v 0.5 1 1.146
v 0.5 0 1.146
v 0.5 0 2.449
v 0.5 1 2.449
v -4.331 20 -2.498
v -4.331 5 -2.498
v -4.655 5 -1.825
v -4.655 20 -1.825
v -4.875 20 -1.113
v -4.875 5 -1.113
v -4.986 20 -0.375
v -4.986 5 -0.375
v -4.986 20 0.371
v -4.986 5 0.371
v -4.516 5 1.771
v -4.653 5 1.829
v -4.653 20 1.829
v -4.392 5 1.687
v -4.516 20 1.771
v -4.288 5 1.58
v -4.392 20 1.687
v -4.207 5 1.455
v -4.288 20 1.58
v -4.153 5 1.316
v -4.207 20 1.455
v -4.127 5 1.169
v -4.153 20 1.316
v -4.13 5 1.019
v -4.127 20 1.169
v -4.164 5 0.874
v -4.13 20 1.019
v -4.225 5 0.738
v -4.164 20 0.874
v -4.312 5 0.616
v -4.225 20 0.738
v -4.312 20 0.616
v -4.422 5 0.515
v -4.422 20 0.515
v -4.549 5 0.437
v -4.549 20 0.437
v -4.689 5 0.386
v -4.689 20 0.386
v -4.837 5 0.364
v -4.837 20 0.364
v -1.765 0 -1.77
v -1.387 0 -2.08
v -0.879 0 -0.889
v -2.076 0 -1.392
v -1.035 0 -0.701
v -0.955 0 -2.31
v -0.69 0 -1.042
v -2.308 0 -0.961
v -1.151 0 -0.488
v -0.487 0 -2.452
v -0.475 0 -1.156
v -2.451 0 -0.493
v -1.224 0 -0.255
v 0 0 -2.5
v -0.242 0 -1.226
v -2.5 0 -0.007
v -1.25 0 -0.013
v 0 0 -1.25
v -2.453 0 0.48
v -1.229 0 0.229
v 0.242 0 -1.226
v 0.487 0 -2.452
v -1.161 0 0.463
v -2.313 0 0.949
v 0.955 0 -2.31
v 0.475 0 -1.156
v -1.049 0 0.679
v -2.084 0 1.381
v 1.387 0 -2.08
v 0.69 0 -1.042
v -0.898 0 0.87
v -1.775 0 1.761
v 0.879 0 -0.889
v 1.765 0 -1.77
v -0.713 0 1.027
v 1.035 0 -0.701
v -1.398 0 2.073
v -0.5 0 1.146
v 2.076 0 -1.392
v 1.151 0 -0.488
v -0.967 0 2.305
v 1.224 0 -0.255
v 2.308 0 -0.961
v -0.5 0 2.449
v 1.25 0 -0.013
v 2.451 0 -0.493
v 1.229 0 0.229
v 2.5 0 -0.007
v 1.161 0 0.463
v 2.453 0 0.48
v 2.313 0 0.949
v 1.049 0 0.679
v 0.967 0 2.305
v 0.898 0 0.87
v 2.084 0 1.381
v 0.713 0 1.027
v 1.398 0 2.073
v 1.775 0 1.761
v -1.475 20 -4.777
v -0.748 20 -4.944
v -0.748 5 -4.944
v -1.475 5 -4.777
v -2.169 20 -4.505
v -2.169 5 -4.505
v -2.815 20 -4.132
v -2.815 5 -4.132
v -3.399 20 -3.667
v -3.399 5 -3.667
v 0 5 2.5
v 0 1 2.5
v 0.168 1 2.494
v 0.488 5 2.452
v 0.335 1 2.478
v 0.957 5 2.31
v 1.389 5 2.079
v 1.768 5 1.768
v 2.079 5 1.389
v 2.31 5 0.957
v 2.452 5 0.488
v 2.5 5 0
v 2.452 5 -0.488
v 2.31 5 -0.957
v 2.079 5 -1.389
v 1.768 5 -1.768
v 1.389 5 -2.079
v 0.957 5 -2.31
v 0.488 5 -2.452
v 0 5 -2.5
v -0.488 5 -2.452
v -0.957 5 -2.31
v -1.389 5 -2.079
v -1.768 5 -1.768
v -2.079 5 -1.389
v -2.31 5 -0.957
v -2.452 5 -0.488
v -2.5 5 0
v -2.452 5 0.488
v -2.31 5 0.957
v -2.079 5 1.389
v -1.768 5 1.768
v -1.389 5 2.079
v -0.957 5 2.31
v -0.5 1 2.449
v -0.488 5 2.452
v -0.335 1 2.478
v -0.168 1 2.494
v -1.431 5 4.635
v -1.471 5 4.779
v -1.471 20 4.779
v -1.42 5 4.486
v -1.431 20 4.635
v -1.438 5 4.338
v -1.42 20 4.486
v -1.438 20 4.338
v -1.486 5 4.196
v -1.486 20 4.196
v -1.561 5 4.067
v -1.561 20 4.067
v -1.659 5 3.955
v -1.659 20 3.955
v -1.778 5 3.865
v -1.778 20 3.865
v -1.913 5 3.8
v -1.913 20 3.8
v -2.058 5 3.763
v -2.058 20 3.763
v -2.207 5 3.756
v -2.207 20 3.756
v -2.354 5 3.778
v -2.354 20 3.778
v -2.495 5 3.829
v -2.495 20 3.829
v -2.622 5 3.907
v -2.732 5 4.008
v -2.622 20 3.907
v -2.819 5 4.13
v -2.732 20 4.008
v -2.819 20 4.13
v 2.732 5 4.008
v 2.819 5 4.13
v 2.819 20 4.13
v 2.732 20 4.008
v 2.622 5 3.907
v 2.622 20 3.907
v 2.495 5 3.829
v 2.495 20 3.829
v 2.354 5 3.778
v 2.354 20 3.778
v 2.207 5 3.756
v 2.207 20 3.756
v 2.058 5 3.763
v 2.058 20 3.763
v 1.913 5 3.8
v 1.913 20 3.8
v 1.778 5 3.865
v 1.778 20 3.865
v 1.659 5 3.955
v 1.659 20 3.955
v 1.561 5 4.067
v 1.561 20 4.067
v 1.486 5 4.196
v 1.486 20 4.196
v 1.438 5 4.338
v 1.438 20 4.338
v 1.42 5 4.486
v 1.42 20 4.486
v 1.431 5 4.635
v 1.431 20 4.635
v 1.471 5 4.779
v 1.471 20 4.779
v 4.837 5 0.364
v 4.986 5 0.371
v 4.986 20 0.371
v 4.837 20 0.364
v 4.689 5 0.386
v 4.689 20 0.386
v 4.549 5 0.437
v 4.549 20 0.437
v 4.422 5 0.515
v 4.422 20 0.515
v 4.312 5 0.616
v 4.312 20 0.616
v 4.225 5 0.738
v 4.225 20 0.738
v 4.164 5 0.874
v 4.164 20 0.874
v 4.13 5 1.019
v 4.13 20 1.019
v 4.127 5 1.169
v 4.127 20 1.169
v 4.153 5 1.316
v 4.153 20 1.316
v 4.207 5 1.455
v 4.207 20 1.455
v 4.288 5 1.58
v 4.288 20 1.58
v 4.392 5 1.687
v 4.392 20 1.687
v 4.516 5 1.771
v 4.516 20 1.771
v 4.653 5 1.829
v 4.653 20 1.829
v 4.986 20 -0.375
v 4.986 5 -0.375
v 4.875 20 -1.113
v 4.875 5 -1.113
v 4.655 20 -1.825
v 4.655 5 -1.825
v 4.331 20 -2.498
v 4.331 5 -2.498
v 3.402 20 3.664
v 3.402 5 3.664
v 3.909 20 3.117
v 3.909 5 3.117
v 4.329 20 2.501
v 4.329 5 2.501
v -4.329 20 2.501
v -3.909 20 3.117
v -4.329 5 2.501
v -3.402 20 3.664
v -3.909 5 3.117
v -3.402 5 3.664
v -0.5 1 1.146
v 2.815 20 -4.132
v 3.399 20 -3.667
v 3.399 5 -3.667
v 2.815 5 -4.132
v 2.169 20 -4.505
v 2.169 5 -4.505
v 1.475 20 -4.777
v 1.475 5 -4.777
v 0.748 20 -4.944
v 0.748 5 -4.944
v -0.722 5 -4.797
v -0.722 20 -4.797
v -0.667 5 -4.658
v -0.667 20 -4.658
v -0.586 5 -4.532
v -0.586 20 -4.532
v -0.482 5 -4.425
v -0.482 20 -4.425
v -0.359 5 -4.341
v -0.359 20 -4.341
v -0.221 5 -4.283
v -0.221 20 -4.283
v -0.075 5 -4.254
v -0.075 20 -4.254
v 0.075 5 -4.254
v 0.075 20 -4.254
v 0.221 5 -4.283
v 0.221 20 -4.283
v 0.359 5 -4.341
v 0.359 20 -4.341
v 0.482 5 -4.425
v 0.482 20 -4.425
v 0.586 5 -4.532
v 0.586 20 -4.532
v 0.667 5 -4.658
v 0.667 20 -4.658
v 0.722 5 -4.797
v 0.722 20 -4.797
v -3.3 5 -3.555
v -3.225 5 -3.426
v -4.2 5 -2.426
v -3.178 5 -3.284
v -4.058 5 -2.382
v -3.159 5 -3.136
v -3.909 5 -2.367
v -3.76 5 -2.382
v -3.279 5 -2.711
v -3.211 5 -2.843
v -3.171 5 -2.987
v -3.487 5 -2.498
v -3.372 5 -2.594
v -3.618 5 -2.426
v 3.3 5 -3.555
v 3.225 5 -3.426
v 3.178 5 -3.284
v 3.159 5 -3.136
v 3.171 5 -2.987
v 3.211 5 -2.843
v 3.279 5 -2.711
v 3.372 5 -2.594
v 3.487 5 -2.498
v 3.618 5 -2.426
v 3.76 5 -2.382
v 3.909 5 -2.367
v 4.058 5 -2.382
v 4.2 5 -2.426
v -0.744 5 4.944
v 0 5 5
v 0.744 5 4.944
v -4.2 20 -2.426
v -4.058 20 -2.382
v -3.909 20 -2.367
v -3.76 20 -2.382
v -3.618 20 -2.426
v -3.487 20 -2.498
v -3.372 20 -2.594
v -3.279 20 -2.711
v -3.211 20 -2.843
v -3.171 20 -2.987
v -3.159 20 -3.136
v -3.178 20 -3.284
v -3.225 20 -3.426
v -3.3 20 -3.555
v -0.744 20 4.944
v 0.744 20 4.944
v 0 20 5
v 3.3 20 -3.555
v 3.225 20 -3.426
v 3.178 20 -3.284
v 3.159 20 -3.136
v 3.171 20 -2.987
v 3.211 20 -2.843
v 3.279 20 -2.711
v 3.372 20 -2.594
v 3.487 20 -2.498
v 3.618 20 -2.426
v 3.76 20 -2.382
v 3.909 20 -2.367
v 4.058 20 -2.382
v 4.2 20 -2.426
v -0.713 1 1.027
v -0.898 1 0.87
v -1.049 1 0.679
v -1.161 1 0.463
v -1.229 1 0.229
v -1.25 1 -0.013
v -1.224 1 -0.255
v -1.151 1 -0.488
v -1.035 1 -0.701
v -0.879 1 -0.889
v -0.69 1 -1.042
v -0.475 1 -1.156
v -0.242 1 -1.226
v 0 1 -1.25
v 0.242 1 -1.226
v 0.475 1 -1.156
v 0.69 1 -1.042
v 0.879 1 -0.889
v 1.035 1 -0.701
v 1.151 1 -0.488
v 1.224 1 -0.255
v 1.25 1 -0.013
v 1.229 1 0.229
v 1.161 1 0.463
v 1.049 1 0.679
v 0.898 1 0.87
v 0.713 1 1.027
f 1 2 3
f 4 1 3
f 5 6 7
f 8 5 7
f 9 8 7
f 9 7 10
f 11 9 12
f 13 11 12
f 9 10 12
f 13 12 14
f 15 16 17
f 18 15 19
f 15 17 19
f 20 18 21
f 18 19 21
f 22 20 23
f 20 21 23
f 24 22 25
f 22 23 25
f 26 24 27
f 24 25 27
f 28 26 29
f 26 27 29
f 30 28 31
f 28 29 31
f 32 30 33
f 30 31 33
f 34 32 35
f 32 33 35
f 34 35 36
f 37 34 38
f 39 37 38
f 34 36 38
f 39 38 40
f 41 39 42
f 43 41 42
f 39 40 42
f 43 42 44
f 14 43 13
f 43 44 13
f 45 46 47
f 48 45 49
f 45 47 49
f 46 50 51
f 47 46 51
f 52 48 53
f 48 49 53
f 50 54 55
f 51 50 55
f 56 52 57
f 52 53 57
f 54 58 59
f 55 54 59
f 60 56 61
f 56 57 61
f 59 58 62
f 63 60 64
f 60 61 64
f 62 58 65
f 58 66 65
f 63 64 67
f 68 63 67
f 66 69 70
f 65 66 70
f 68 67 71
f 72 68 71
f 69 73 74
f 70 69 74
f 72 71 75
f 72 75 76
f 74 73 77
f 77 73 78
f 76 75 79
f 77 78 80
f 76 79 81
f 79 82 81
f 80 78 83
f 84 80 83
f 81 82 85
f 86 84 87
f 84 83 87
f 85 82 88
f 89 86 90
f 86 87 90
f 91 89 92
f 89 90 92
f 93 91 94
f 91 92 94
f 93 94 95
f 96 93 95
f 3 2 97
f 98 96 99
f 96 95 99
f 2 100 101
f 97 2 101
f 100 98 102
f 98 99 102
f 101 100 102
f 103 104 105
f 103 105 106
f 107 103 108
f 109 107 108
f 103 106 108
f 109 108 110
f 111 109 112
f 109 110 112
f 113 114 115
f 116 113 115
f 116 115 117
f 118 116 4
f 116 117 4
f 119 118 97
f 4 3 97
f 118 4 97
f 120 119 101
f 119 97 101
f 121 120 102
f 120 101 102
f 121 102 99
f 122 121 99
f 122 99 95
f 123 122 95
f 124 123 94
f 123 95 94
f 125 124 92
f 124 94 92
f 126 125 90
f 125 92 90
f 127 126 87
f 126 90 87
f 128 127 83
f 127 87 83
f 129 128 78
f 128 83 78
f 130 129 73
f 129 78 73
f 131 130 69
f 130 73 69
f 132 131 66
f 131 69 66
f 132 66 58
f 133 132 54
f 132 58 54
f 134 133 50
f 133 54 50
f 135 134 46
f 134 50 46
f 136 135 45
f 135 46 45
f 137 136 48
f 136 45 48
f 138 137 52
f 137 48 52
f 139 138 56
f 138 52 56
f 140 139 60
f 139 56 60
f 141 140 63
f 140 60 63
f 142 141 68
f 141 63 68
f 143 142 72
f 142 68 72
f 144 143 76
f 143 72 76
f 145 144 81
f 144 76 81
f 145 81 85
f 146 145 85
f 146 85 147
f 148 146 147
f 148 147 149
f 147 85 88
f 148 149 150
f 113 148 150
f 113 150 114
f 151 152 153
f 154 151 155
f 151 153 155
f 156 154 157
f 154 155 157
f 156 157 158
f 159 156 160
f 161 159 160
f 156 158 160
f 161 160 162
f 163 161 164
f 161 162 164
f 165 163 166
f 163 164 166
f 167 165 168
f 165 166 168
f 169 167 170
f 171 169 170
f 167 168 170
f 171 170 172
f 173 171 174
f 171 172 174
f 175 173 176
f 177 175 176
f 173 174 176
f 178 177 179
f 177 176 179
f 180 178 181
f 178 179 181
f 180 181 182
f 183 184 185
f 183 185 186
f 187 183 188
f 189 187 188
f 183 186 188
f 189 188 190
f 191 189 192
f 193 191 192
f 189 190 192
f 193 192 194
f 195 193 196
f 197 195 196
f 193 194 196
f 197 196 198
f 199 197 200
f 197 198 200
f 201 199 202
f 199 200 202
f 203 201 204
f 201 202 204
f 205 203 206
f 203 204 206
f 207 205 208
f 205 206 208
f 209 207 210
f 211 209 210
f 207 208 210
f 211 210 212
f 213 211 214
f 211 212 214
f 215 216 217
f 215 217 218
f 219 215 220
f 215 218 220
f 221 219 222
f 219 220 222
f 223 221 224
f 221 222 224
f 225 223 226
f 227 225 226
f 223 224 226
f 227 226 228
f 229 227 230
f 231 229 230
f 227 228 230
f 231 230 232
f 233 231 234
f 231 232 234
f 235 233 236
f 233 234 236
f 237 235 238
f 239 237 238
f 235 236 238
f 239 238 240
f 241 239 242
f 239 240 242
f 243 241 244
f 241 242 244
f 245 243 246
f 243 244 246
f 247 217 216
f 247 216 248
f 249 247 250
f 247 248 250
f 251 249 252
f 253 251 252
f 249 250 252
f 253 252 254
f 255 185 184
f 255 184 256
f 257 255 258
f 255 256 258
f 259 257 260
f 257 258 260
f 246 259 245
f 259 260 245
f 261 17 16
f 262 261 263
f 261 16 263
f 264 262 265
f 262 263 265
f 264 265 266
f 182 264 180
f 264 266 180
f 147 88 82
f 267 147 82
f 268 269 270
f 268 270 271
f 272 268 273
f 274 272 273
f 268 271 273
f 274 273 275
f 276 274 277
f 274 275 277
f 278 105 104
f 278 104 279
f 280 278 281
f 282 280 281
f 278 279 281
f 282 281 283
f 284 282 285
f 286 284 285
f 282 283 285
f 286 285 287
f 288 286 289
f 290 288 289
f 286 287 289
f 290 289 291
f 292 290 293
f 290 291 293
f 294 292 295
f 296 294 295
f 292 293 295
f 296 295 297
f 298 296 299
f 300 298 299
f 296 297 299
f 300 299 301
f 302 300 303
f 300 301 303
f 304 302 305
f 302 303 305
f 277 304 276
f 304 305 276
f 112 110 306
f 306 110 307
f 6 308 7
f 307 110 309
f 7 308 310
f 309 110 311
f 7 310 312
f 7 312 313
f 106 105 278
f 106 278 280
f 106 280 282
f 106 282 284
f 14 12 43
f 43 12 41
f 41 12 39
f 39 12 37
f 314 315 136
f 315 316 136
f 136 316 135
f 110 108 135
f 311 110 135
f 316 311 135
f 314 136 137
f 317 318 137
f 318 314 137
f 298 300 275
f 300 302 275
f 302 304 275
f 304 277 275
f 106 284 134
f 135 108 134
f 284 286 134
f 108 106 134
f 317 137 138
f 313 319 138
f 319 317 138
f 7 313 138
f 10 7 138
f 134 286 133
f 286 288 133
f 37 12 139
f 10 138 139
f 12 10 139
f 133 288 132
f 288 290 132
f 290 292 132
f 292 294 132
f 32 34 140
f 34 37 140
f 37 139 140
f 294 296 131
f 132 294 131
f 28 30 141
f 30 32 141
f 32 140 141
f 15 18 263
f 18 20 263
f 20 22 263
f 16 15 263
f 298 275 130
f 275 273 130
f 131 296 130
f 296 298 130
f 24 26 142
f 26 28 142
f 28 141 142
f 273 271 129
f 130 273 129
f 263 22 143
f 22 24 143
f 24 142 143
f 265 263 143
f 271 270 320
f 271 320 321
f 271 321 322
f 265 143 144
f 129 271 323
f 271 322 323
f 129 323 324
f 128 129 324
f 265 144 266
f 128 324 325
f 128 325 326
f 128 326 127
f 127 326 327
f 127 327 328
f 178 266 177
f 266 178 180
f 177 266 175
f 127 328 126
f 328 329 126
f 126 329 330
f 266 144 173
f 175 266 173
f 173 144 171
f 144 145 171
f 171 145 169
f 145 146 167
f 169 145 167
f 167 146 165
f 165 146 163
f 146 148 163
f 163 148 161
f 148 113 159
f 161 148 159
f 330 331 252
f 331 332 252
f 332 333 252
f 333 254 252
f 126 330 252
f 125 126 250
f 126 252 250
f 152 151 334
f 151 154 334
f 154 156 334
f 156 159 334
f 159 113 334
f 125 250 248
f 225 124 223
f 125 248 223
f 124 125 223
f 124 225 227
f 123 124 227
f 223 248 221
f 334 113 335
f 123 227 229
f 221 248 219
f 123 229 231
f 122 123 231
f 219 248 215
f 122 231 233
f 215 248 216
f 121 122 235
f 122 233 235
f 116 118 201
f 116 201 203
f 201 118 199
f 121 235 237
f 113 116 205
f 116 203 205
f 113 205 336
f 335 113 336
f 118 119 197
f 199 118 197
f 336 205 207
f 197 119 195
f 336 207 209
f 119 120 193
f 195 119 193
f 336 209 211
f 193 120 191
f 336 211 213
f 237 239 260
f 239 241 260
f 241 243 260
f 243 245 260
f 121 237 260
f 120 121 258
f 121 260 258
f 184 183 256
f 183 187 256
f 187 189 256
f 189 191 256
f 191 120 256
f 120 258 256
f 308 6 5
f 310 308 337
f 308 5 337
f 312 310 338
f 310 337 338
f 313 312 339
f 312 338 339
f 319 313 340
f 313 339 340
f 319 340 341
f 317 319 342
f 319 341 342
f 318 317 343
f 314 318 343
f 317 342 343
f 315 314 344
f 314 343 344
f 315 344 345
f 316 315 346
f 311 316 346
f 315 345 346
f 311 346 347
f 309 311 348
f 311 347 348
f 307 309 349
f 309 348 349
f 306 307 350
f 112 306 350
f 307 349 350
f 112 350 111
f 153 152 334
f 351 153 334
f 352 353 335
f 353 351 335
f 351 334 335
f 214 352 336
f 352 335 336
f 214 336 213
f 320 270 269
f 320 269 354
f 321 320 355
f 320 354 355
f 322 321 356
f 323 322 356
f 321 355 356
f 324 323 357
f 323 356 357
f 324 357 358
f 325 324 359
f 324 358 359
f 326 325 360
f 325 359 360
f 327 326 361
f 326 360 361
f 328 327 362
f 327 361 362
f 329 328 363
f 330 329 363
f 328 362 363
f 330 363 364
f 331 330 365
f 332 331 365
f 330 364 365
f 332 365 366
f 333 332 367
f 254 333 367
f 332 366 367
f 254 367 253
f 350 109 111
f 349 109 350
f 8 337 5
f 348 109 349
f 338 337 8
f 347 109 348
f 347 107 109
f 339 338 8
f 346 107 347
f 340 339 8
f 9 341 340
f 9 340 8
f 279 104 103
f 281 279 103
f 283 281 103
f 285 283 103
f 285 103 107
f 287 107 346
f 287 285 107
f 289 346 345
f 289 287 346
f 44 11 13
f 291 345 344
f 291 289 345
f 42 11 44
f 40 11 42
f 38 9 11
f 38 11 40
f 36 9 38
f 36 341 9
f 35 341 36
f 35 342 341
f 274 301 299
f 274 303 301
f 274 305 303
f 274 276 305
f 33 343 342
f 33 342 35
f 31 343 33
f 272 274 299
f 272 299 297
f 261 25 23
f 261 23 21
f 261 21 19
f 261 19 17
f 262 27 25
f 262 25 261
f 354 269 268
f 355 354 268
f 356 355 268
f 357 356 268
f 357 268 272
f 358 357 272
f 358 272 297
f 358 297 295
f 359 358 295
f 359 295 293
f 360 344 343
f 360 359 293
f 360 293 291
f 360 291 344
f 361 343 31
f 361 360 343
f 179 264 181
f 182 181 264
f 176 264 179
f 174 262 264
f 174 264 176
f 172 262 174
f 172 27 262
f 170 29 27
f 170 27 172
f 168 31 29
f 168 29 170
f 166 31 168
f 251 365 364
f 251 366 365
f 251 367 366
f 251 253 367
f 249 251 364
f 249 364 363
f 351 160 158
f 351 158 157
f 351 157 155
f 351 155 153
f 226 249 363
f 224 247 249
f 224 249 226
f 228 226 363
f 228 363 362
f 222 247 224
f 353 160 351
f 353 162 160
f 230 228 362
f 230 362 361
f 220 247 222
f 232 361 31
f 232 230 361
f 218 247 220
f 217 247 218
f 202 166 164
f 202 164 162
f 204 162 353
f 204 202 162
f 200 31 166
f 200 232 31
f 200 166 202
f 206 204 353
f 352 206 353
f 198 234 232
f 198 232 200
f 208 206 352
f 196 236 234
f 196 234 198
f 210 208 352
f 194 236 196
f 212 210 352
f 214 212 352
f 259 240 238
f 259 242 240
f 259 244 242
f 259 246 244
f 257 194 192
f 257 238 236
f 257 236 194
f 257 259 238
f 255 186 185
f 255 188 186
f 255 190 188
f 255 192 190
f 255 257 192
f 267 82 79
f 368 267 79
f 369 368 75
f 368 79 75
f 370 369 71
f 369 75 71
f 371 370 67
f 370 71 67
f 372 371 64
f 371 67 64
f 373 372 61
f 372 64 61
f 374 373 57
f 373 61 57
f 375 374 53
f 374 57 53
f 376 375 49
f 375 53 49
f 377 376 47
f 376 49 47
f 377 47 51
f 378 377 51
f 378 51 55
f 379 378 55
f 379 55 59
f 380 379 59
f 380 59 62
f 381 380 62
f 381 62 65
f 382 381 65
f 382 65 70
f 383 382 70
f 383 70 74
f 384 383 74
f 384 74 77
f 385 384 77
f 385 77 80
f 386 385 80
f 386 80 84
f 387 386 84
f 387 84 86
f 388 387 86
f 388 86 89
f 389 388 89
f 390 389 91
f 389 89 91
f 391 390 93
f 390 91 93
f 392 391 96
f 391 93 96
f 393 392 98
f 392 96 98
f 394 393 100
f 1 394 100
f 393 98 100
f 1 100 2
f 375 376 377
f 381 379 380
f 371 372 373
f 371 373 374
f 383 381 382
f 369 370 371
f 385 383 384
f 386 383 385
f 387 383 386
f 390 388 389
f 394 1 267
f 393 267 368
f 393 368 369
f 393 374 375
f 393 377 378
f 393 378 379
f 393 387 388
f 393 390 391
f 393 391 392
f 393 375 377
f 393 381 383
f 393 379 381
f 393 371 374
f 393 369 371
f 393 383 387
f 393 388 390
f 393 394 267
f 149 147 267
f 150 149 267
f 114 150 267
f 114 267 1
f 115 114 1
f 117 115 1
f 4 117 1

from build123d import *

# Parameters (mm, degrees)
SKETCH2_R           = 2.5
BOSS_EXTRUDE1_DEPTH = 5
SKETCH3_R           = 5
BOSS_EXTRUDE2_DEPTH = 15
SKETCH4_R           = 0.75
CUT_EXTRUDE1_DEPTH  = 15
SKETCH5_R           = 1.25
CUT_EXTRUDE2_DEPTH  = 1
CUT_EXTRUDE3_DEPTH  = 1


with BuildPart() as part:
    # Sketch2 → Boss-Extrude1 (new body)
    with BuildSketch(Plane(origin=(0, 0, 0), x_dir=(1, 0, 0), z_dir=(0, 1, 0))):
        with Locations(Location((0, 0, 0), (0, 0, 270))):
            Circle(SKETCH2_R)
    extrude(amount=BOSS_EXTRUDE1_DEPTH)

    # Sketch3 → Boss-Extrude2 (add)
    with BuildSketch(Plane(origin=(0, 5, 0), x_dir=(1, 0, 0), z_dir=(0, 1, 0))):
        with Locations(Location((0, 0, 0), (0, 0, 270))):
            Circle(SKETCH3_R)
    extrude(amount=BOSS_EXTRUDE2_DEPTH)

    # Sketch4 → Cut-Extrude1 (cut)
    with BuildSketch(Plane(origin=(0, 20, 0), x_dir=(1, 0, 0), z_dir=(0, 1, 0))):
        with Locations((0, 5)):
            Circle(SKETCH4_R)
        with Locations((3.909157412, 3.117449009)):
            Circle(SKETCH4_R)
        with Locations((4.874639561, -1.11260467)):
            Circle(SKETCH4_R)
        with Locations((2.169418696, -4.50484434)):
            Circle(SKETCH4_R)
        with Locations((-2.169418696, -4.50484434)):
            Circle(SKETCH4_R)
        with Locations((-4.874639561, -1.11260467)):
            Circle(SKETCH4_R)
        with Locations((-3.909157412, 3.117449009)):
            Circle(SKETCH4_R)
    extrude(amount=-CUT_EXTRUDE1_DEPTH, mode=Mode.SUBTRACT)

    # Sketch5 → Cut-Extrude2 (cut)
    with BuildSketch(Plane.XZ):
        with Locations(Location((0, 0, 0), (0, 0, 270))):
            Circle(SKETCH5_R)
    extrude(amount=-CUT_EXTRUDE2_DEPTH, mode=Mode.SUBTRACT)

    # Sketch6 → Cut-Extrude3 (cut)
    with BuildSketch(Plane.XZ):
        with BuildLine():
            Line((-0.5, 2.449489743), (-0.5, 1.145643924))
            ThreePointArc((-0.5, 1.145643924), (0, 1.25), (0.5, 1.145643924))
            Line((0.5, 1.145643924), (0.5, 2.449489743))
            ThreePointArc((0.5, 2.449489743), (0, 2.5), (-0.5, 2.449489743))
        make_face()
    extrude(amount=-CUT_EXTRUDE3_DEPTH, mode=Mode.SUBTRACT)


solid = part.part
